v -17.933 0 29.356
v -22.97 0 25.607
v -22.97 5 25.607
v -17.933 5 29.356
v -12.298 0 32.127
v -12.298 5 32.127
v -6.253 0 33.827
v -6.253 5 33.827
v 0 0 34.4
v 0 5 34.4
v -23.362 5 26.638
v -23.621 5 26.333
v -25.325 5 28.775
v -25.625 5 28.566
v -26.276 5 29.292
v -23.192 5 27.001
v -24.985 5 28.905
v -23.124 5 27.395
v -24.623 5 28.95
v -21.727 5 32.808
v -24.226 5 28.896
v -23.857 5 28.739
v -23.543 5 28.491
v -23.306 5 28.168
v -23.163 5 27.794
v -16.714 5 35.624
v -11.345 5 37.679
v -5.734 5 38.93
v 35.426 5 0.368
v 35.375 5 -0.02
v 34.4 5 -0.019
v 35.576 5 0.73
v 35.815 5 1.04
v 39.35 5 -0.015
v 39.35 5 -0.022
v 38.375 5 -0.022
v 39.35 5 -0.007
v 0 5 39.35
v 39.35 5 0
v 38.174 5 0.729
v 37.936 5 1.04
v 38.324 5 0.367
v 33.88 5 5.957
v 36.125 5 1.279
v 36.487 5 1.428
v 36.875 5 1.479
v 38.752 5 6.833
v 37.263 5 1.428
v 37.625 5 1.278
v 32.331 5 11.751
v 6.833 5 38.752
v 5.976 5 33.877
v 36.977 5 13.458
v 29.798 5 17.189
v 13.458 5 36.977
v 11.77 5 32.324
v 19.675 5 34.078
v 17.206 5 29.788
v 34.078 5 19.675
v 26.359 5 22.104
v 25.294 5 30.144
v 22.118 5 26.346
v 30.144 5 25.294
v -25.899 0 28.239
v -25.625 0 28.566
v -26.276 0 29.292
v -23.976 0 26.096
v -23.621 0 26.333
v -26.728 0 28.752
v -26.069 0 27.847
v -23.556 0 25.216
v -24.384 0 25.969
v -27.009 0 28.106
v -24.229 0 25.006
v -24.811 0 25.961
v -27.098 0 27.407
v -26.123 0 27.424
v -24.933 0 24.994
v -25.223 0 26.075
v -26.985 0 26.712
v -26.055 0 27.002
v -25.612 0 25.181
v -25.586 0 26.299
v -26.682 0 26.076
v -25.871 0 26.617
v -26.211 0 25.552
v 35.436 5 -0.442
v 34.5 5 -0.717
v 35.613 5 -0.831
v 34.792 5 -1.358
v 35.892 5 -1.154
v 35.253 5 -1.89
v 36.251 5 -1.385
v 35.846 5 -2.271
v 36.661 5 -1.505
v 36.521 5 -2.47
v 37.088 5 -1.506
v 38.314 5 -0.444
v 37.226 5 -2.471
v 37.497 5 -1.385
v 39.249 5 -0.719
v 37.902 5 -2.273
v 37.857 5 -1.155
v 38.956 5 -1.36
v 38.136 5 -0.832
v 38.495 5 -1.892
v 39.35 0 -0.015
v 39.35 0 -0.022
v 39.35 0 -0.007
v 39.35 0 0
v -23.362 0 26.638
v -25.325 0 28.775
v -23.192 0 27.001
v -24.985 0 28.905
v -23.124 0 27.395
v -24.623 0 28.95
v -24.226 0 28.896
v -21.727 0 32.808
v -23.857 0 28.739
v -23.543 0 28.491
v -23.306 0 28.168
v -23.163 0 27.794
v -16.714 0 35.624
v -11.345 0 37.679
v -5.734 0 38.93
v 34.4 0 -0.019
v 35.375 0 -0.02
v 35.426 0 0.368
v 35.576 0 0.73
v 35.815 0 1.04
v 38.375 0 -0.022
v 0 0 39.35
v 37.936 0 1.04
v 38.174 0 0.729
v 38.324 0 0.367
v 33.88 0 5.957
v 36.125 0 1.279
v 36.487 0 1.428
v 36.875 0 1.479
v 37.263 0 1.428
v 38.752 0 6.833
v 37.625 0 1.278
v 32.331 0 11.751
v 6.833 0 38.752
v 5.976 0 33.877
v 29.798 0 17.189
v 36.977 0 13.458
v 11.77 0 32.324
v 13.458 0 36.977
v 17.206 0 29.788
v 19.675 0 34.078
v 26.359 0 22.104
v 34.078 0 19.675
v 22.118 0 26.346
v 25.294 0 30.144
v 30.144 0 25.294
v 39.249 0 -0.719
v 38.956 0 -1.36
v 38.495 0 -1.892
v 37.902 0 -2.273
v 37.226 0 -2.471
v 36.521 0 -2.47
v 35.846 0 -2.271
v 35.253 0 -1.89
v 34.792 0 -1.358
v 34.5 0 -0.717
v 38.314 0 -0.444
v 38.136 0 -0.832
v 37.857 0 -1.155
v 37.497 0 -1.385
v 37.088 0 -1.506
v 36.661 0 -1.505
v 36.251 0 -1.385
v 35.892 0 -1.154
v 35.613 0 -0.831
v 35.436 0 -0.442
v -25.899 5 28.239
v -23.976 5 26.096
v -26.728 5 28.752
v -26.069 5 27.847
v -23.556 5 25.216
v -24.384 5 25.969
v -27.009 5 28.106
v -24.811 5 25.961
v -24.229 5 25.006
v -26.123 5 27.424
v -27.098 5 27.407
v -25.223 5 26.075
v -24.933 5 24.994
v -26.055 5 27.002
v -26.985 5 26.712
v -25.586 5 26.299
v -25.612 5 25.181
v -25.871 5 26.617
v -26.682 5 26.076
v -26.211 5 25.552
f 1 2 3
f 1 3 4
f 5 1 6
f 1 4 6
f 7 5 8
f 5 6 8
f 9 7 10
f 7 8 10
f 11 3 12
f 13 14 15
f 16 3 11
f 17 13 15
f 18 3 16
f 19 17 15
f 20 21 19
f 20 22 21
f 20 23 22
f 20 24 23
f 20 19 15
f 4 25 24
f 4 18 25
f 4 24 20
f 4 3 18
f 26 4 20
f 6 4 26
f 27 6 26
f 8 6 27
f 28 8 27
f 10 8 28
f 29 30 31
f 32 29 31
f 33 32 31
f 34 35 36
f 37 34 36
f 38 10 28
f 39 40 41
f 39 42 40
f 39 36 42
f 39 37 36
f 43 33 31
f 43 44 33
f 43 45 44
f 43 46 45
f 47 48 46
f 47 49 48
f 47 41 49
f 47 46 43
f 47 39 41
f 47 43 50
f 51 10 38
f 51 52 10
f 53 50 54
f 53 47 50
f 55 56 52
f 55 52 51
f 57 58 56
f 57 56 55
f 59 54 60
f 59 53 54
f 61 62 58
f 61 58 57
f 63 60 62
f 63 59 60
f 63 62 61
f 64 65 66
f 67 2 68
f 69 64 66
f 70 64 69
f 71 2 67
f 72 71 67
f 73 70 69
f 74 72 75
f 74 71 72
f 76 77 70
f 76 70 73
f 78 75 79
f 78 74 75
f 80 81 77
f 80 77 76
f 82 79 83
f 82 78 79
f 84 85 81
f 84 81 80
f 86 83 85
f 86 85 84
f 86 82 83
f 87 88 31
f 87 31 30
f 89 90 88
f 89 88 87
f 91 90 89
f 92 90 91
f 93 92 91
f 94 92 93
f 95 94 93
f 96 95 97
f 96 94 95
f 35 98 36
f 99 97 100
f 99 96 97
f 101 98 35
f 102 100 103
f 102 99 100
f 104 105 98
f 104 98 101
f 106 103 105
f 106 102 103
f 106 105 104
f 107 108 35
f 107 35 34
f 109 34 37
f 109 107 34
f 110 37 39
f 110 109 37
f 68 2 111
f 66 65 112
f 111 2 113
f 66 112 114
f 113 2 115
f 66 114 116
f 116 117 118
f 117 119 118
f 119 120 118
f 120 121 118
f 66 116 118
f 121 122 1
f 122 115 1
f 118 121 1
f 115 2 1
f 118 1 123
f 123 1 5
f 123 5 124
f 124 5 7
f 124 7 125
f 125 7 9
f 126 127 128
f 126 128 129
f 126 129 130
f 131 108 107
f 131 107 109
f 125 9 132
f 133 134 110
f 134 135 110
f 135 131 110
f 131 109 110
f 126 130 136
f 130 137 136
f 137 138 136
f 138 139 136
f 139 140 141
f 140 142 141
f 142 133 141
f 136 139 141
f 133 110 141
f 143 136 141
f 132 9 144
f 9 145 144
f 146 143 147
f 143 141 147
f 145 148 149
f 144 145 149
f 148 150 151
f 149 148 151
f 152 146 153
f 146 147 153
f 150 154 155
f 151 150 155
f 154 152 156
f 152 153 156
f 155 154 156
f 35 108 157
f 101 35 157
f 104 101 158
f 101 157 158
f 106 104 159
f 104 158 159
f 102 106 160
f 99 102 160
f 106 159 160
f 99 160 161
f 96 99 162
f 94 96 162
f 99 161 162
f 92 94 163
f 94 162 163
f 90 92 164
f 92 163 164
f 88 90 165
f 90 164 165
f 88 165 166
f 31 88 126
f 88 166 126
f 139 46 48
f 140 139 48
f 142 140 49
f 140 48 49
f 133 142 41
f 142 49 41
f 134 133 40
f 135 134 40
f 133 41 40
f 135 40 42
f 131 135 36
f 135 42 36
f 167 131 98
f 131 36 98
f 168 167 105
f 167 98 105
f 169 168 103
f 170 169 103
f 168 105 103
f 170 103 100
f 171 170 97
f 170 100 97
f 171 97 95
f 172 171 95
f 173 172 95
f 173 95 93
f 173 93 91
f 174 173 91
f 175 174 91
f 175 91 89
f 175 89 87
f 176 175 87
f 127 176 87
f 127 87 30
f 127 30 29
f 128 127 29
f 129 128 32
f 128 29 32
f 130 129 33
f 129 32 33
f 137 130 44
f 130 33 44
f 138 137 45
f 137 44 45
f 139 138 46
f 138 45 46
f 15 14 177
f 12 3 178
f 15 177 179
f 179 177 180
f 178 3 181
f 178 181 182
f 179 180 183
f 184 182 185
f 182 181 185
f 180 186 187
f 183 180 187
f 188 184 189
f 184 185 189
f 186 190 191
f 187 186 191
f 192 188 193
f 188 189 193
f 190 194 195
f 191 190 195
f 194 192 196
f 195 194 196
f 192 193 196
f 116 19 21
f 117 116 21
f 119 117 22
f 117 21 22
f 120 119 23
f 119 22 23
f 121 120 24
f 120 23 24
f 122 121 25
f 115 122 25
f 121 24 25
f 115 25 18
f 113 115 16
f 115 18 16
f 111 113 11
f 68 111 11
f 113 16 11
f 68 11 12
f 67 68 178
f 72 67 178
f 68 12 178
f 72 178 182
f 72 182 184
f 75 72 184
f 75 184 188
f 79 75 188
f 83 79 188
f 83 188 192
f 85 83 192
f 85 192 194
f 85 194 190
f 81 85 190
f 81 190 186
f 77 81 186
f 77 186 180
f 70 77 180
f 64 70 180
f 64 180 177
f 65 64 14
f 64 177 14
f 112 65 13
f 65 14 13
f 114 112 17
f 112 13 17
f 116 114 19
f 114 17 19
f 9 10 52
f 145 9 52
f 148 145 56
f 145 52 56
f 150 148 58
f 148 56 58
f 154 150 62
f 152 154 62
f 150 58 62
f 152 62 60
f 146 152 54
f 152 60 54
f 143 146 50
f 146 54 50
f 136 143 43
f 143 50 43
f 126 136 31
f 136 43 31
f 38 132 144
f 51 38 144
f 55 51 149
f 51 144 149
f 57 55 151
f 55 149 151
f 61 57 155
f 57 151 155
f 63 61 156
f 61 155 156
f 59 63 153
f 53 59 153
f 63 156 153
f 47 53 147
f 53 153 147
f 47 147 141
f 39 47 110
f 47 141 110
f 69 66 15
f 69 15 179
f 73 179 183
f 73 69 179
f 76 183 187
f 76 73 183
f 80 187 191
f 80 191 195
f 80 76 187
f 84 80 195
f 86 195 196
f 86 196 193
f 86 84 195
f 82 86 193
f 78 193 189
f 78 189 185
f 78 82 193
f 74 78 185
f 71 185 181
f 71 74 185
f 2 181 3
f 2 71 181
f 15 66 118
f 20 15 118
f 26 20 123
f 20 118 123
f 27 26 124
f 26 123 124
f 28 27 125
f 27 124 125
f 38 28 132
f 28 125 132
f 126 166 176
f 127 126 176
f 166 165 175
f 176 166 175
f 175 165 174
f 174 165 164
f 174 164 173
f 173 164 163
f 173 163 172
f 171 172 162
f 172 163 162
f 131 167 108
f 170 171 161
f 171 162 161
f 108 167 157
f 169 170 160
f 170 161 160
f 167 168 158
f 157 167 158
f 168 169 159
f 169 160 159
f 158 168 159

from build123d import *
from build123d.topology import SkipClean

# Parameters (mm, degrees)
SKETCH1_R           = 39.35
BOSS_EXTRUDE1_DEPTH = 5
SKETCH2_R           = 34.4
CUT_EXTRUDE1_DEPTH  = 5
CUT_EXTRUDE2_START  = -5
CUT_EXTRUDE2_DEPTH  = 5
BOSS_EXTRUDE2_START = -5
BOSS_EXTRUDE2_DEPTH = 5
BOSS_EXTRUDE3_START = -5
BOSS_EXTRUDE3_DEPTH = 5
SKETCH11_R          = 1.5
CUT_EXTRUDE3_DEPTH  = 5
SKETCH12_R          = 1.5
CUT_EXTRUDE4_DEPTH  = 5


with BuildPart() as part:
    # Sketch1 → Boss-Extrude1 (new body)
    with BuildSketch(Plane(origin=(0, 0, 0), x_dir=(1, 0, 0), z_dir=(0, 1, 0))):
        with Locations(Location((0, 0, 0), (0, 0, 270))):
            Circle(SKETCH1_R)
    extrude(amount=BOSS_EXTRUDE1_DEPTH)

    # Sketch2 → Cut-Extrude1 (cut)
    with BuildSketch(Plane(origin=(0, 5, 0), x_dir=(1, 0, 0), z_dir=(0, 1, 0))):
        with Locations(Location((0, 0, 0), (0, 0, 270))):
            Circle(SKETCH2_R)
    extrude(amount=-CUT_EXTRUDE1_DEPTH, mode=Mode.SUBTRACT)

    # Sketch4 → Cut-Extrude2 (cut)
    with SkipClean():  # the faces are left unmerged after this step: merging them gives an invalid solid
        with BuildSketch(Plane(origin=(0, 5, 0), x_dir=(1, 0, 0), z_dir=(0, 1, 0)).offset(CUT_EXTRUDE2_START)):
            with BuildLine():
                Line((-159.77746759, -178.119268716), (-26.275583759, -29.291913528))
                Line((-26.275583759, -29.291913528), (0, 0))
                Line((0, 0), (39.349993818, 0.02205808))
                ThreePointArc((39.349993818, 0.02205808), (16.048747068, -35.928543215), (-26.275583759, -29.291913528))
                ThreePointArc((-26.275583759, -29.291913528), (16.038676365, -35.933039956), (39.35, 0))
                Line((39.35, 0), (39.35, 199.930824633))
                Line((39.35, 199.930824633), (-314.435547484, 386.277611421))
                Line((-314.435547484, 386.277611421), (-513.563015073, 8.227518071))
                Line((-513.563015073, 8.227518071), (-159.77746759, -178.119268716))
            make_face()
        extrude(amount=CUT_EXTRUDE2_DEPTH, mode=Mode.SUBTRACT)

    # Sketch9 → Boss-Extrude2 (add)
    with SkipClean():  # the faces are left unmerged after this step: merging them gives an invalid solid
        with BuildSketch(Plane(origin=(0, 5, 0), x_dir=(1, 0, 0), z_dir=(0, 1, 0)).offset(BOSS_EXTRUDE2_START)):
            with BuildLine():
                Line((-22.970268903, -25.607162016), (-26.275583759, -29.291913528))
                ThreePointArc((-26.275583759, -29.291913528), (16.048747068, -35.928543215), (39.349993818, 0.02205808))
                ThreePointArc((39.349993818, 0.02205808), (36.873606818, 2.495670303), (34.399994595, 0.019283303))
                ThreePointArc((34.399994595, 0.019283303), (14.029908491, -31.40894248), (-22.970268903, -25.607162016))
            make_face()
        extrude(amount=BOSS_EXTRUDE2_DEPTH)

    # Sketch10 → Boss-Extrude3 (add)
    with SkipClean():  # the faces are left unmerged after this step: merging them gives an invalid solid
        with BuildSketch(Plane(origin=(0, 5, 0), x_dir=(1, 0, 0), z_dir=(0, 1, 0)).offset(BOSS_EXTRUDE3_START)):
            with BuildLine():
                ThreePointArc((-26.275583759, -29.291913528), (-26.465302087, -25.796880344), (-22.970268903, -25.607162016))
                ThreePointArc((-22.970268903, -25.607162016), (14.029908491, -31.40894248), (34.399994595, 0.019283303))
                ThreePointArc((34.399994595, 0.019283303), (36.873606818, 2.495670303), (39.349993818, 0.02205808))
                ThreePointArc((39.349993818, 0.02205808), (16.048747068, -35.928543215), (-26.275583759, -29.291913528))
            make_face()
        extrude(amount=BOSS_EXTRUDE3_DEPTH)

    # Sketch11 → Cut-Extrude3 (cut)
    with SkipClean():  # the faces are left unmerged after this step: merging them gives an invalid solid
        with BuildSketch(Plane(origin=(0, 5, 0), x_dir=(1, 0, 0), z_dir=(0, 1, 0))):
            with Locations(Location((-24.622926331, -27.449537772, 0), (0, 0, 270))):
                Circle(SKETCH11_R)
        extrude(amount=-CUT_EXTRUDE3_DEPTH, mode=Mode.SUBTRACT)

    # Sketch12 → Cut-Extrude4 (cut)
    with SkipClean():  # the faces are left unmerged after this step: merging them gives an invalid solid
        with BuildSketch(Plane(origin=(0, 5, 0), x_dir=(1, 0, 0), z_dir=(0, 1, 0))):
            with Locations(Location((36.874994206, 0.020670692, 0), (0, 0, 270))):
                Circle(SKETCH12_R)
        extrude(amount=-CUT_EXTRUDE4_DEPTH, mode=Mode.SUBTRACT)


solid = part.part
